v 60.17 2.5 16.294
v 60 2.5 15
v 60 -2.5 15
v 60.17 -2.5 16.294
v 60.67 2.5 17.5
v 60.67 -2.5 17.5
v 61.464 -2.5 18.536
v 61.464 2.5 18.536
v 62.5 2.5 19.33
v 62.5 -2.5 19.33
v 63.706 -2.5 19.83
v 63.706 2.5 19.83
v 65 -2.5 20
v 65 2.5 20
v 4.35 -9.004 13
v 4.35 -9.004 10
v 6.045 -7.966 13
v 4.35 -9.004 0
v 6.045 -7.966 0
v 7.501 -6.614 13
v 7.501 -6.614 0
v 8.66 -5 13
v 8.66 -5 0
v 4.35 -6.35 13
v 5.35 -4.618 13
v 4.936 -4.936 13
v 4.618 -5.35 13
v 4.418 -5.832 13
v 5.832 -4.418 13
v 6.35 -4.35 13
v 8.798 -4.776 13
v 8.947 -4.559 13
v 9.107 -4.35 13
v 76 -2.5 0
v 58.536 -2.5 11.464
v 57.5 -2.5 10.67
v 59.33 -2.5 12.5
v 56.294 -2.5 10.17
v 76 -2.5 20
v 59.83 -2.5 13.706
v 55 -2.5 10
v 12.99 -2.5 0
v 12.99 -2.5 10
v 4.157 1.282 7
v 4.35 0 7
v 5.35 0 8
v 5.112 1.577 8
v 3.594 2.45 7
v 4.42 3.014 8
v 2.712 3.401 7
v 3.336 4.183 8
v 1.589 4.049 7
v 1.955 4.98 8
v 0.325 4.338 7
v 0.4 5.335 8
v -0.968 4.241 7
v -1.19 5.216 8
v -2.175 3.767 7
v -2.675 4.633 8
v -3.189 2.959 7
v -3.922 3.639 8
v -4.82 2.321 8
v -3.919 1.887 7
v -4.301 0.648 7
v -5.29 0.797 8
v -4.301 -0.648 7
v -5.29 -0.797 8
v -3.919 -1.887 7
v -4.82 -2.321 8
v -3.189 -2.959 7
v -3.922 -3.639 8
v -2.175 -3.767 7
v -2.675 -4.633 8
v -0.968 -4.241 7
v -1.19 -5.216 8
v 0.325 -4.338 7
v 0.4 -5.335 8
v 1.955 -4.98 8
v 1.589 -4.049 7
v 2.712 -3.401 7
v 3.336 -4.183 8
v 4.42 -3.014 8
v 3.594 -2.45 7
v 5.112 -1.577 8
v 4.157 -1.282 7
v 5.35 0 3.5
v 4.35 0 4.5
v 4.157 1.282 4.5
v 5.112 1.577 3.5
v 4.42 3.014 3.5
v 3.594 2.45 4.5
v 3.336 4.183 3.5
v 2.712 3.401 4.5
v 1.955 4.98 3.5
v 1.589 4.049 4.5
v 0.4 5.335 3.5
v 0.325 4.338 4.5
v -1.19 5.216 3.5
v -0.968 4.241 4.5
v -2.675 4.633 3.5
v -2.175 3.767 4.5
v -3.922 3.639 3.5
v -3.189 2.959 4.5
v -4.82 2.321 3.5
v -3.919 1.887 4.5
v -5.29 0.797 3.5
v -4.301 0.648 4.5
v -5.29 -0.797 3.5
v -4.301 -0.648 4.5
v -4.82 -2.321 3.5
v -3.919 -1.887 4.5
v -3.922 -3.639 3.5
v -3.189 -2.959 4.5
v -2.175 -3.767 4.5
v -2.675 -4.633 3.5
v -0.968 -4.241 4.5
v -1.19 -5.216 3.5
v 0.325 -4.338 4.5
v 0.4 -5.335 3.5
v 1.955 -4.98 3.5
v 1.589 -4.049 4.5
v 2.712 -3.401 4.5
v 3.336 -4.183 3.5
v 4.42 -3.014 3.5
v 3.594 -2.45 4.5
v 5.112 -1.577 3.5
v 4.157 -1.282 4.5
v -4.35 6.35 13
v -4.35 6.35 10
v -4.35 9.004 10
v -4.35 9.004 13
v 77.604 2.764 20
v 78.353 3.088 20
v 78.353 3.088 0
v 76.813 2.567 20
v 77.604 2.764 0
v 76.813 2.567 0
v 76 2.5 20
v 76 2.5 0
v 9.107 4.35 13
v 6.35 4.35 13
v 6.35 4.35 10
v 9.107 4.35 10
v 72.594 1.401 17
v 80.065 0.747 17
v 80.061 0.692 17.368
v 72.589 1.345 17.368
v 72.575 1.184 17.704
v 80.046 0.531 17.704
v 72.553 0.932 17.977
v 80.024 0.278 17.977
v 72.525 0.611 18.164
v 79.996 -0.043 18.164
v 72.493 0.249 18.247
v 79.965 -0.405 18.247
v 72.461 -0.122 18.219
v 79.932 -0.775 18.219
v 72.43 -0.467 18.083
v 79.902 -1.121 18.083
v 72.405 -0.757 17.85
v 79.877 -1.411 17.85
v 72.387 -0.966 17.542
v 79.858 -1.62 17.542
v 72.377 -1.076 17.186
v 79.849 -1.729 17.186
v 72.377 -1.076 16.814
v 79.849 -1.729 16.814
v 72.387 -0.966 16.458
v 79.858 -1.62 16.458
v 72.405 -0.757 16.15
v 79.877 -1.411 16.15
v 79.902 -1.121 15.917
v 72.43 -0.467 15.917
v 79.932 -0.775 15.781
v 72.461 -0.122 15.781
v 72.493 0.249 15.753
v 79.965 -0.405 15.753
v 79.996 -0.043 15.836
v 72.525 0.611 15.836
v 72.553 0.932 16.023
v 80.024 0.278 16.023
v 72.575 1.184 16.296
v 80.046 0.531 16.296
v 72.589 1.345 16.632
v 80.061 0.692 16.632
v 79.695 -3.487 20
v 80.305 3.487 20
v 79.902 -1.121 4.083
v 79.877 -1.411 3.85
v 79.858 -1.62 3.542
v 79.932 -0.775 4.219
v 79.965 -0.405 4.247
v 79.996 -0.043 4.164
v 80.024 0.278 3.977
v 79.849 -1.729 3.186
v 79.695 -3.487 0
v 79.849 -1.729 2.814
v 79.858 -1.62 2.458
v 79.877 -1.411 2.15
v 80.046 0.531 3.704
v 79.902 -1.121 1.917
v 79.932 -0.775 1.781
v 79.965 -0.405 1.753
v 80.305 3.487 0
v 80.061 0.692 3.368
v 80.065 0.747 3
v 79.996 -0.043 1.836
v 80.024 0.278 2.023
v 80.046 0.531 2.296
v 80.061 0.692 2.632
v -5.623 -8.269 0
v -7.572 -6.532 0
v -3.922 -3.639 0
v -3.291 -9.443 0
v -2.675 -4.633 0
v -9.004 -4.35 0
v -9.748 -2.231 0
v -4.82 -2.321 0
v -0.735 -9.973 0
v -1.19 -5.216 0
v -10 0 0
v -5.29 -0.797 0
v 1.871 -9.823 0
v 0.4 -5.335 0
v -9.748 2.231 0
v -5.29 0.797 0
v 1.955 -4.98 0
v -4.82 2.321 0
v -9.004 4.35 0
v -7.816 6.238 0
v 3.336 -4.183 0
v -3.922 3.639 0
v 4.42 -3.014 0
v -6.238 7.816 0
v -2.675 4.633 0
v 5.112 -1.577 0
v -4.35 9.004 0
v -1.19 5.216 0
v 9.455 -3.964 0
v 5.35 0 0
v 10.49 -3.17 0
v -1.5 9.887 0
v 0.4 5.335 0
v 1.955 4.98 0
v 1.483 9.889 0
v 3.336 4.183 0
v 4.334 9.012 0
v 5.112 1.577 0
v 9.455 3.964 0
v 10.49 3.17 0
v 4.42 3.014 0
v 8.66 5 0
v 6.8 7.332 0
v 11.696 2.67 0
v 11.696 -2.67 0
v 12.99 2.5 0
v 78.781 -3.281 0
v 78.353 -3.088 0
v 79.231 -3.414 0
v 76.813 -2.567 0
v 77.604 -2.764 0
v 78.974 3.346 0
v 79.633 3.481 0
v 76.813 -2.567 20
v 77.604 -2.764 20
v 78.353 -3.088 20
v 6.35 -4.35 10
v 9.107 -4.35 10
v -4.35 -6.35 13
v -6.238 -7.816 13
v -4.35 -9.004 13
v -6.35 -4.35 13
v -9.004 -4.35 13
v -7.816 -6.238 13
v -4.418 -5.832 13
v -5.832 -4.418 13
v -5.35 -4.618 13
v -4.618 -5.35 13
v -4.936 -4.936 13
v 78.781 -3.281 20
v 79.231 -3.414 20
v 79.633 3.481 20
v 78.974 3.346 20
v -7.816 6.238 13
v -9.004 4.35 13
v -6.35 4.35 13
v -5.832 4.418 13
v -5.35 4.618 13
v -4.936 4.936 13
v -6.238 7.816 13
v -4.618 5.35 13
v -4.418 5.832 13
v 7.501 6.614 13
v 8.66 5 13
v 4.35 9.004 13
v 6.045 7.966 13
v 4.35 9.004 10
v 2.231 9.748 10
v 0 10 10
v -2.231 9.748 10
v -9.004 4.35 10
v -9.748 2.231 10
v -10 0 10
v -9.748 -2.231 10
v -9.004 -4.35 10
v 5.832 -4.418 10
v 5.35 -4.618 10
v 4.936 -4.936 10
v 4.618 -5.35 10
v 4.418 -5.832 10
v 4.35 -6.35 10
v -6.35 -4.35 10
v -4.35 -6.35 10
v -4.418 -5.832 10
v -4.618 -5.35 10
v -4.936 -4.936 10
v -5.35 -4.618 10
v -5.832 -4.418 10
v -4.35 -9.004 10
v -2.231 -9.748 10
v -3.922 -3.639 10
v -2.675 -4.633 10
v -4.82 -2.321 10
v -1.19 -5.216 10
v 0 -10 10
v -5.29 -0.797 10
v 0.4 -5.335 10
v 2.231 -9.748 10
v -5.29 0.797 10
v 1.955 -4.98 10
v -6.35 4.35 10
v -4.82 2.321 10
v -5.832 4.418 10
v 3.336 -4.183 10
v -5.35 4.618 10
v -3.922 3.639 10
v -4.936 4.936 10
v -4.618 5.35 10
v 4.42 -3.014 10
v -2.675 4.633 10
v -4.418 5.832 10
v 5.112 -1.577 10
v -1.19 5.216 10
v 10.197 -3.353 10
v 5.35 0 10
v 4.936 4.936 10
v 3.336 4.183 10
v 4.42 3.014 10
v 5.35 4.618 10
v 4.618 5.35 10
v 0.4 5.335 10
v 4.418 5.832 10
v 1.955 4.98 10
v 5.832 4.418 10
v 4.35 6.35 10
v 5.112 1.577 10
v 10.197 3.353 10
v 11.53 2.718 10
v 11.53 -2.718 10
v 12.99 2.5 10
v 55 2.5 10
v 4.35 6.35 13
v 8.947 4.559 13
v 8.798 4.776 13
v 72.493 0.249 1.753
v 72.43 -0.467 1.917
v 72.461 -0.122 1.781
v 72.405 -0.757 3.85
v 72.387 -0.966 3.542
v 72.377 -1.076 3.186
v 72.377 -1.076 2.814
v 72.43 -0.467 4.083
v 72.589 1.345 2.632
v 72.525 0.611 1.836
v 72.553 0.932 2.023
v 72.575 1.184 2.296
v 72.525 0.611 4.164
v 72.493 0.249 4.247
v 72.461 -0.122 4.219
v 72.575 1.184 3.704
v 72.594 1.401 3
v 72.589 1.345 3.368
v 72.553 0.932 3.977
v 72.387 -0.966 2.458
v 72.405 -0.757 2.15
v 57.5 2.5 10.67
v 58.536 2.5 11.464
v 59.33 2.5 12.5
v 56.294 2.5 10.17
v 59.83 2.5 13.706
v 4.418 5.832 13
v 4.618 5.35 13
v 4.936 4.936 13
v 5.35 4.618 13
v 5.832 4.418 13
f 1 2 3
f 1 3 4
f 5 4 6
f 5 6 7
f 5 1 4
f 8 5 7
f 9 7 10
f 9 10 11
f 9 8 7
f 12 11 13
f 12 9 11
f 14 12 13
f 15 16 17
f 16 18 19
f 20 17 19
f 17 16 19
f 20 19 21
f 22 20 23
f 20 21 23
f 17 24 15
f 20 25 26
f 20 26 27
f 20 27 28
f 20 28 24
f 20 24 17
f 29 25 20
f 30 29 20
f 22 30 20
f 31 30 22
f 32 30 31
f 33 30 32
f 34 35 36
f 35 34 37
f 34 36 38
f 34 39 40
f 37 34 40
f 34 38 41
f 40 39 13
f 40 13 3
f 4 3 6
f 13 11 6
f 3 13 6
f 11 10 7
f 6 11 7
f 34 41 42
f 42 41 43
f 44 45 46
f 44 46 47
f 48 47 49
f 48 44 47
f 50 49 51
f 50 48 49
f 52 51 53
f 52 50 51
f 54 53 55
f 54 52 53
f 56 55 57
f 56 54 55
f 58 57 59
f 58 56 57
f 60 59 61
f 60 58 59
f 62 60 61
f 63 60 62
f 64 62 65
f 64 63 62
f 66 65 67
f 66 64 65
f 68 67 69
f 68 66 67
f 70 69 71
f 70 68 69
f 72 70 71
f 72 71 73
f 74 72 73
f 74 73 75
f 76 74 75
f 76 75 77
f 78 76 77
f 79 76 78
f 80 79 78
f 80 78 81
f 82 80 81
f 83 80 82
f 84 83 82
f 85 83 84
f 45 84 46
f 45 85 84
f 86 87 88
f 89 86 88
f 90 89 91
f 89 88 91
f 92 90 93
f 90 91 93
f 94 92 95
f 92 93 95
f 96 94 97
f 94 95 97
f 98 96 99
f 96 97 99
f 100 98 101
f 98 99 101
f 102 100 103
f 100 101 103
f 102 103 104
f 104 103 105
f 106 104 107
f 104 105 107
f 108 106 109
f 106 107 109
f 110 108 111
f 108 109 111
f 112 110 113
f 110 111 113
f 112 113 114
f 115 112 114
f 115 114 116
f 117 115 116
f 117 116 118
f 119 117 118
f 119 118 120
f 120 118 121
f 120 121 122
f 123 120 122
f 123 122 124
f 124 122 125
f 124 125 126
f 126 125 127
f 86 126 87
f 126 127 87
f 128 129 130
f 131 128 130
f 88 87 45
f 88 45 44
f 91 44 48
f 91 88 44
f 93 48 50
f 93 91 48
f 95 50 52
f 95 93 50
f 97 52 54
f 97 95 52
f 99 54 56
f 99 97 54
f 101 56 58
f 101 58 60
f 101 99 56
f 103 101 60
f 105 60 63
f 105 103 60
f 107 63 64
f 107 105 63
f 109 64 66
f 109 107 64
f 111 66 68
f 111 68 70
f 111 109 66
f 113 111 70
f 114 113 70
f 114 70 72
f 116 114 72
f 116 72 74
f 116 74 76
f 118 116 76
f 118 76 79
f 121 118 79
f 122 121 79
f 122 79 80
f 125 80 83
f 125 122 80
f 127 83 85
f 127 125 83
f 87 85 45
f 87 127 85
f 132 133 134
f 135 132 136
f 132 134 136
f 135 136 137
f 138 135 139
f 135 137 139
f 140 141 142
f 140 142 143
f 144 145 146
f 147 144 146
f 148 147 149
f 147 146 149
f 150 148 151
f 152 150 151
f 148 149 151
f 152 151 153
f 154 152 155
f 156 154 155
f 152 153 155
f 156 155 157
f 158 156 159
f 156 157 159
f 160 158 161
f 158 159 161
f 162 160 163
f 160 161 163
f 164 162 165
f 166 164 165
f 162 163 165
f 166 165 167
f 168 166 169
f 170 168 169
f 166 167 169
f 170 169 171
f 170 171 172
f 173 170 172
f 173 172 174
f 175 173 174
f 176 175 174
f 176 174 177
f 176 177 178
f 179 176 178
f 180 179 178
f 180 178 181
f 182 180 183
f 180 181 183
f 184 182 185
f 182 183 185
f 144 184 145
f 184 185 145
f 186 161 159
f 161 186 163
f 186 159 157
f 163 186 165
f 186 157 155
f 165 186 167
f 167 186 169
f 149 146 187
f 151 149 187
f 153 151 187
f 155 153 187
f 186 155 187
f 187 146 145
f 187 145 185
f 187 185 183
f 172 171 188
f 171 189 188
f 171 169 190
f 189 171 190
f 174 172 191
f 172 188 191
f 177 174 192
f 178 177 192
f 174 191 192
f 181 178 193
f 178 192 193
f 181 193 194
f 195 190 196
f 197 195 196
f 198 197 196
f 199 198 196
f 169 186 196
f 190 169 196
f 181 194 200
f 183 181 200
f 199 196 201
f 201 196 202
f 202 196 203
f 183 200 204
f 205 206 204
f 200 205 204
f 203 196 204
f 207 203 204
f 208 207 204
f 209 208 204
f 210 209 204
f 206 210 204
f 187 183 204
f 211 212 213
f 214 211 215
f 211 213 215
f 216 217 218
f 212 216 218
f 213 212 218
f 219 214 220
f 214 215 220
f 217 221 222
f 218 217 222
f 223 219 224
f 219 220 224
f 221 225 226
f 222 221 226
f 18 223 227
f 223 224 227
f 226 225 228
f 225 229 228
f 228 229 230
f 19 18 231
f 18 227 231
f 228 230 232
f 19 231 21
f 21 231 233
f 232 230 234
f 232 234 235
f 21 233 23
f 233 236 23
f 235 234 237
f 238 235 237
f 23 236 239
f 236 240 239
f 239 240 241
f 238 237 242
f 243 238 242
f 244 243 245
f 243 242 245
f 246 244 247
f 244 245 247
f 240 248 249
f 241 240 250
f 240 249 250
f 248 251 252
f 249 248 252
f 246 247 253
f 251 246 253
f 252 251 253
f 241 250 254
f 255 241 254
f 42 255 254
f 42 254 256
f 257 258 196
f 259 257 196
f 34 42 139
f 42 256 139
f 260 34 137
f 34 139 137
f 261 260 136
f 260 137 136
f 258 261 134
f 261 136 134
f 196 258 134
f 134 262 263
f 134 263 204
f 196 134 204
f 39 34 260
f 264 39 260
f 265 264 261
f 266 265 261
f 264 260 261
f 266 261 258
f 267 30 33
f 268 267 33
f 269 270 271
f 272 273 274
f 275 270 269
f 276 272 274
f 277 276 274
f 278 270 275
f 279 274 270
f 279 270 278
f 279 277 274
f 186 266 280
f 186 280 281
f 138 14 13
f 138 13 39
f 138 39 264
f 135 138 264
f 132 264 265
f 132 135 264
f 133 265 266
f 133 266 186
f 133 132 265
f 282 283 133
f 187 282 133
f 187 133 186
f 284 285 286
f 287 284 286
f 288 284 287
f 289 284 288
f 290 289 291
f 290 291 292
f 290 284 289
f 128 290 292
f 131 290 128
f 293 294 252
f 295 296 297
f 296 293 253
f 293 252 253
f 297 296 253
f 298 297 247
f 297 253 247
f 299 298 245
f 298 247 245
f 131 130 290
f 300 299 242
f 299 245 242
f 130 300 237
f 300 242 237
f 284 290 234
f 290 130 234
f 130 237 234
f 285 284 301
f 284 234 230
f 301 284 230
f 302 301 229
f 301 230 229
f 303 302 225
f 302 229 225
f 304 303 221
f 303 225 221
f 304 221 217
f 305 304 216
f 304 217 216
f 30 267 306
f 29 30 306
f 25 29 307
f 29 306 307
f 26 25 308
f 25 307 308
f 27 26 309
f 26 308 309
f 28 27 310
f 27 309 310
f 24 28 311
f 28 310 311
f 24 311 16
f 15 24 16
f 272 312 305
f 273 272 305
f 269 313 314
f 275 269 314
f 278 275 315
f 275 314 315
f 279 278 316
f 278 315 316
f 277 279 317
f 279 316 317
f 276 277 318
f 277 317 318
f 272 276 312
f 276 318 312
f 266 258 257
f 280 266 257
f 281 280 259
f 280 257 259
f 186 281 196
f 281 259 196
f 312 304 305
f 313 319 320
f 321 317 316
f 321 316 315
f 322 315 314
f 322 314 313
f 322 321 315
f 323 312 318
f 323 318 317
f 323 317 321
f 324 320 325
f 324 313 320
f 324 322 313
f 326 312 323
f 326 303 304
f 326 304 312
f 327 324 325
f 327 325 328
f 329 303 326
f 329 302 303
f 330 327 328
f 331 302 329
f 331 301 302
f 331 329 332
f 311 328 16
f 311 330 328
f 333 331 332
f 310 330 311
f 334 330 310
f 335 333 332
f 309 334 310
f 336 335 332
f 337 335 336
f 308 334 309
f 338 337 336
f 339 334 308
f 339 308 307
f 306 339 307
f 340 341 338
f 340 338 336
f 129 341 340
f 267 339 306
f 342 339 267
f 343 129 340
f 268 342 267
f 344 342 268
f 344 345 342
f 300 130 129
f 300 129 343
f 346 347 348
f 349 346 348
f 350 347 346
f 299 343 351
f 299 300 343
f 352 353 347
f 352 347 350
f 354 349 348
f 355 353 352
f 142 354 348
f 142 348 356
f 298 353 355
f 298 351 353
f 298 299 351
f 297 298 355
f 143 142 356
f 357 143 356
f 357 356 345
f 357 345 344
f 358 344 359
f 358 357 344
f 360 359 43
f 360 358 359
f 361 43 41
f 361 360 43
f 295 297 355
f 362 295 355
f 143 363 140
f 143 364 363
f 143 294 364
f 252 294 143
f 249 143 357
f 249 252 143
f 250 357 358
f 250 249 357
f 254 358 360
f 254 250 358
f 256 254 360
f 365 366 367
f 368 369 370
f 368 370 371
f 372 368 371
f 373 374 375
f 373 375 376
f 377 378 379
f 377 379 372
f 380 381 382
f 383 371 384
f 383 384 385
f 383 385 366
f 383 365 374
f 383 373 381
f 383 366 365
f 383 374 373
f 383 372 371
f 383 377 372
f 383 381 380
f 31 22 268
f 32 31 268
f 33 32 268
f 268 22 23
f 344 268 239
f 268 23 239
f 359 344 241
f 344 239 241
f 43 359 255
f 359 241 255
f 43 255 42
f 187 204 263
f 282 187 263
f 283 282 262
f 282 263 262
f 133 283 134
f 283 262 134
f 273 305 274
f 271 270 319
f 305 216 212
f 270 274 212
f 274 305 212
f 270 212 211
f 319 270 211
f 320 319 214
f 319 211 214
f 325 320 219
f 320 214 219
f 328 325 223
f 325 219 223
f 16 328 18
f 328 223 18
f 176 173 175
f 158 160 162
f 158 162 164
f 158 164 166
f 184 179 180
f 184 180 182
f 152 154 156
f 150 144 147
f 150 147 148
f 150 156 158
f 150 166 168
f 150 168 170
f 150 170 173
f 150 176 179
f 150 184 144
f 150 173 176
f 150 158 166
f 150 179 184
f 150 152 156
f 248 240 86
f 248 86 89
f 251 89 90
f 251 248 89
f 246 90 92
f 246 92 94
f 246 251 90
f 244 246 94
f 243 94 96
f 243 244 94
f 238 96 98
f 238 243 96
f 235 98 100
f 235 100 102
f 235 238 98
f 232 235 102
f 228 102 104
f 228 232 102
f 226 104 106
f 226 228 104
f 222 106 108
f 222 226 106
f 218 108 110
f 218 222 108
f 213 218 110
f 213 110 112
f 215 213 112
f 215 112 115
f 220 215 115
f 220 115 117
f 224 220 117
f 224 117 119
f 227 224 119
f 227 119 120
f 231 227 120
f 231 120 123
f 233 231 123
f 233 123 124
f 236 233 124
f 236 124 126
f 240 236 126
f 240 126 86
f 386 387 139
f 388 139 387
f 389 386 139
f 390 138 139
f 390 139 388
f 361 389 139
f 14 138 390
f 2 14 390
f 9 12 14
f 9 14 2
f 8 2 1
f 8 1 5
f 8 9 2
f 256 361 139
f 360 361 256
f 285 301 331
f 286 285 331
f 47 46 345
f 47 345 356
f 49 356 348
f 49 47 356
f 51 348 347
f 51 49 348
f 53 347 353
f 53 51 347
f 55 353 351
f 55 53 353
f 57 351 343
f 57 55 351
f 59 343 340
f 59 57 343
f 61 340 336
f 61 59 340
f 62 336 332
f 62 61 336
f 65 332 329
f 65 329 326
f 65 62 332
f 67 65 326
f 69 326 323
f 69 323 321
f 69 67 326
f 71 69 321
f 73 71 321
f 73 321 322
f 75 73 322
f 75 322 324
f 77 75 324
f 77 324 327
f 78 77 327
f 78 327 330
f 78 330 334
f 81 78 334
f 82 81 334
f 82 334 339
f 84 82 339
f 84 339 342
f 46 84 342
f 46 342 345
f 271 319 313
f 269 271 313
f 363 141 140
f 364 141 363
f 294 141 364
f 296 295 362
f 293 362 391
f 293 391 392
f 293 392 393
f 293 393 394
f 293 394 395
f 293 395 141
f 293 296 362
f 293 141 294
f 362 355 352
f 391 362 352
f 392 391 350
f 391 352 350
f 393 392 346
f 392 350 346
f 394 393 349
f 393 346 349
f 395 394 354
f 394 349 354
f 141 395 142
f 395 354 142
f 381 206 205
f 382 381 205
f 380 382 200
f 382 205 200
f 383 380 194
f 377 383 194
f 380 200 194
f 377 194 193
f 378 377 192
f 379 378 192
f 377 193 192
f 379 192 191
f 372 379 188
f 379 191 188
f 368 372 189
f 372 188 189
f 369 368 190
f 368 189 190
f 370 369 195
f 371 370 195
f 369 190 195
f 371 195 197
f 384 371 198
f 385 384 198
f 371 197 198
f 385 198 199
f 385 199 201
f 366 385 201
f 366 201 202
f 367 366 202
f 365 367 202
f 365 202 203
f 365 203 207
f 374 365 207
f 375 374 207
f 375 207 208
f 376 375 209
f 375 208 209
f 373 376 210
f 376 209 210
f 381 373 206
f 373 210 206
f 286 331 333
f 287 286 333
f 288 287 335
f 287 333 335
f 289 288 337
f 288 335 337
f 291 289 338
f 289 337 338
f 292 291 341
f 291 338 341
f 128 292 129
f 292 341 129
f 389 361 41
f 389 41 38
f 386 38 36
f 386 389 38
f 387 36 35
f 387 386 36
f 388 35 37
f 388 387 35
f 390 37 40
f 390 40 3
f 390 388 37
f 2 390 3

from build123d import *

# Parameters (mm, degrees)
F0_R         = 5.35
F1_DEPTH     = 10
F2_START     = 3.5
F0_R_2       = 4.35
F2_DEPTH     = 4.5
F3_SIZE      = 0.99999
F4_DEPTH     = 13
F5_DEPTH     = 20
F6_R         = 1.25
F7_DEPTH     = 7.5
F8_T1_DEPTH  = 20
F8_T3_DEPTH  = 5
F8_T8_DEPTH  = 10
F8_T13_DEPTH = 10
F8_T18_DEPTH = 18.2698067281
F8_T25_DEPTH = 10
F8_T30_DEPTH = 10
F8_T35_DEPTH = 18.2698067281
F8_T39_DEPTH = 30


# Not quite as in the source:
# - a fillet or chamfer that OpenCascade refuses, or shapes differently, is made with other operations: its cross-section is extruded or revolved along the edge and cut away or added
# - a fillet or chamfer is up to 0.001 mm smaller than in the source, because OpenCascade refuses the exact size


with BuildPart() as f1:
    # F0 (on Top) → F1 (new body)
    with BuildSketch(Plane.XY):
        with BuildLine():
            Line((-4.35, 6.35), (-4.35, 9.0043045262))
            ThreePointArc((-4.35, 9.0043045262), (-7.0710678119, 7.0710678119), (-9.0043045262, 4.35))
            Line((-9.0043045262, 4.35), (-6.35, 4.35))
            ThreePointArc((-6.35, 4.35), (-4.9357864376, 4.9357864376), (-4.35, 6.35))
        make_face()
        with BuildLine():
            ThreePointArc((9.6824583655, -2.5), (9.9202969627, -1.2600429248), (10, 0))
            ThreePointArc((10, 0), (9.9202969627, 1.2600429248), (9.6824583655, 2.5))
            ThreePointArc((9.6824583655, 2.5), (9.3890575588, 3.4417434764), (9.0043045262, 4.35))
            Line((9.0043045262, 4.35), (6.35, 4.35))
            ThreePointArc((6.35, 4.35), (4.9357864376, 4.9357864376), (4.35, 6.35))
            Line((4.35, 6.35), (4.35, 9.0043045262))
            ThreePointArc((4.35, 9.0043045262), (0, 10), (-4.35, 9.0043045262))
            Line((-4.35, 9.0043045262), (-4.35, 6.35))
            ThreePointArc((-4.35, 6.35), (-4.9357864376, 4.9357864376), (-6.35, 4.35))
            Line((-6.35, 4.35), (-9.0043045262, 4.35))
            ThreePointArc((-9.0043045262, 4.35), (-10, 0), (-9.0043045262, -4.35))
            Line((-9.0043045262, -4.35), (-6.35, -4.35))
            ThreePointArc((-6.35, -4.35), (-4.9357864376, -4.9357864376), (-4.35, -6.35))
            Line((-4.35, -6.35), (-4.35, -9.0043045262))
            ThreePointArc((-4.35, -9.0043045262), (0, -10), (4.35, -9.0043045262))
            Line((4.35, -9.0043045262), (4.35, -6.35))
            ThreePointArc((4.35, -6.35), (4.9357864376, -4.9357864376), (6.35, -4.35))
            Line((6.35, -4.35), (9.0043045262, -4.35))
            ThreePointArc((9.0043045262, -4.35), (9.3890575588, -3.4417434764), (9.6824583655, -2.5))
        make_face()
        Circle(F0_R, mode=Mode.SUBTRACT)
        with BuildLine():
            ThreePointArc((-9.0043045262, -4.35), (-7.0710678119, -7.0710678119), (-4.35, -9.0043045262))
            Line((-4.35, -9.0043045262), (-4.35, -6.35))
            ThreePointArc((-4.35, -6.35), (-4.9357864376, -4.9357864376), (-6.35, -4.35))
            Line((-6.35, -4.35), (-9.0043045262, -4.35))
        make_face()
        with BuildLine():
            ThreePointArc((4.35, -9.0043045262), (7.0710678119, -7.0710678119), (9.0043045262, -4.35))
            Line((9.0043045262, -4.35), (6.35, -4.35))
            ThreePointArc((6.35, -4.35), (4.9357864376, -4.9357864376), (4.35, -6.35))
            Line((4.35, -6.35), (4.35, -9.0043045262))
        make_face()
        with BuildLine():
            Line((6.35, 4.35), (9.0043045262, 4.35))
            ThreePointArc((9.0043045262, 4.35), (7.0710678119, 7.0710678119), (4.35, 9.0043045262))
            Line((4.35, 9.0043045262), (4.35, 6.35))
            ThreePointArc((4.35, 6.35), (4.9357864376, 4.9357864376), (6.35, 4.35))
        make_face()
        with BuildLine():
            ThreePointArc((9.6824583655, 2.5), (9.9202969627, 1.2600429248), (10, 0))
            ThreePointArc((10, 0), (9.9202969627, -1.2600429248), (9.6824583655, -2.5))
            Line((9.6824583655, -2.5), (60, -2.5))
            Line((60, -2.5), (60, 2.5))
            Line((60, 2.5), (9.6824583655, 2.5))
        make_face()
        with BuildLine():
            Line((77.5505102572, 2.5), (60, 2.5))
            Line((60, 2.5), (60, -2.5))
            Line((60, -2.5), (77.5505102572, -2.5))
            ThreePointArc((77.5505102572, -2.5), (76.5, 0), (77.5505102572, 2.5))
        make_face()
        with BuildLine():
            ThreePointArc((80.3050450996, 3.4866814433), (78.8197263984, 3.2949892603), (77.5505102572, 2.5))
            ThreePointArc((77.5505102572, 2.5), (76.5, 0), (77.5505102572, -2.5))
            ThreePointArc((77.5505102572, -2.5), (78.5370404595, -3.179583209), (79.6949549004, -3.4866814433))
            Line((79.6949549004, -3.4866814433), (80, 0))
            Line((80, 0), (80.3050450996, 3.4866814433))
        make_face()
    extrude(amount=F1_DEPTH)

    # F0 (on Top) → F2 (join)
    with BuildSketch(Plane.XY.offset(F2_START)):
        Circle(F0_R)
        Circle(F0_R_2, mode=Mode.SUBTRACT)
    extrude(amount=F2_DEPTH)

    # F3 (size 1 in the source; OpenCascade refuses exactly that, so slightly less here)
    f3_edges = [f1.edges().sort_by_distance(p)[0] for p in [
        (-4.35, 0, 3.5),
        (-4.35, 0, 8),
    ]]
    chamfer(f3_edges, length=F3_SIZE)

    # F0 (on Top) → F4 (join)
    with BuildSketch(Plane.XY):
        with BuildLine():
            ThreePointArc((-9.0043045262, -4.35), (-7.0710678119, -7.0710678119), (-4.35, -9.0043045262))
            Line((-4.35, -9.0043045262), (-4.35, -6.35))
            ThreePointArc((-4.35, -6.35), (-4.9357864376, -4.9357864376), (-6.35, -4.35))
            Line((-6.35, -4.35), (-9.0043045262, -4.35))
        make_face()
        with BuildLine():
            ThreePointArc((4.35, -9.0043045262), (7.0710678119, -7.0710678119), (9.0043045262, -4.35))
            Line((9.0043045262, -4.35), (6.35, -4.35))
            ThreePointArc((6.35, -4.35), (4.9357864376, -4.9357864376), (4.35, -6.35))
            Line((4.35, -6.35), (4.35, -9.0043045262))
        make_face()
        with BuildLine():
            Line((6.35, 4.35), (9.0043045262, 4.35))
            ThreePointArc((9.0043045262, 4.35), (7.0710678119, 7.0710678119), (4.35, 9.0043045262))
            Line((4.35, 9.0043045262), (4.35, 6.35))
            ThreePointArc((4.35, 6.35), (4.9357864376, 4.9357864376), (6.35, 4.35))
        make_face()
        with BuildLine():
            Line((-4.35, 6.35), (-4.35, 9.0043045262))
            ThreePointArc((-4.35, 9.0043045262), (-7.0710678119, 7.0710678119), (-9.0043045262, 4.35))
            Line((-9.0043045262, 4.35), (-6.35, 4.35))
            ThreePointArc((-6.35, 4.35), (-4.9357864376, 4.9357864376), (-4.35, 6.35))
        make_face()
    extrude(amount=F4_DEPTH)

    # F0 (on Top) → F5 (join)
    with BuildSketch(Plane.XY):
        with BuildLine():
            ThreePointArc((80.3050450996, 3.4866814433), (78.8197263984, 3.2949892603), (77.5505102572, 2.5))
            ThreePointArc((77.5505102572, 2.5), (76.5, 0), (77.5505102572, -2.5))
            ThreePointArc((77.5505102572, -2.5), (78.5370404595, -3.179583209), (79.6949549004, -3.4866814433))
            Line((79.6949549004, -3.4866814433), (80, 0))
            Line((80, 0), (80.3050450996, 3.4866814433))
        make_face()
        with BuildLine():
            Line((77.5505102572, 2.5), (60, 2.5))
            Line((60, 2.5), (60, -2.5))
            Line((60, -2.5), (77.5505102572, -2.5))
            ThreePointArc((77.5505102572, -2.5), (76.5, 0), (77.5505102572, 2.5))
        make_face()
    extrude(amount=F5_DEPTH)

    # F6 (on face) → F7 (cut)
    with BuildSketch(Plane(origin=(79.3923101205, -6.9459271067, 0), x_dir=(0.0871557427, 0.9961946981, 0), z_dir=(0.9961946981, -0.0871557427, 0))):
        with Locations((6.4724594198, 17)):
            Circle(F6_R)
        with Locations((6.4724594198, 3)):
            Circle(F6_R)
    extrude(amount=-F7_DEPTH, mode=Mode.SUBTRACT)

    # F8: fillet of radius 5 on 6 edges, made by hand

    # F8_s2 → F8_t1 (join)
    with BuildSketch(Plane.XY):
        with BuildLine():
            ThreePointArc((78.3529411765, 3.0882352941), (77.2126781252, 2.6492874993), (76, 2.5))
            Line((76, 2.5), (77.5505102572, 2.5))
            ThreePointArc((77.5505102572, 2.5), (77.9307168562, 2.822776518), (78.3529411765, 3.0882352941))
        make_face()
        with BuildLine():
            ThreePointArc((76, -2.5), (77.2126781252, -2.6492874993), (78.3529411765, -3.0882352941))
            ThreePointArc((78.3529411765, -3.0882352941), (77.9307168562, -2.822776518), (77.5505102572, -2.5))
            Line((77.5505102572, -2.5), (76, -2.5))
        make_face()
    extrude(amount=F8_T1_DEPTH)

    # F8_s4 → F8_t3 (join)
    with BuildSketch(Plane.XZ.offset(-2.5)):
        with BuildLine():
            ThreePointArc((55, 10), (58.5355339059, 11.4644660941), (60, 15))
            Line((60, 15), (60, 10))
            Line((60, 10), (55, 10))
        make_face()
    extrude(amount=F8_T3_DEPTH)


with BuildPart() as f8_tool6:
    # F8_s7 → F8_t8 (new body)
    with BuildSketch(Plane.XY):
        with BuildLine():
            ThreePointArc((8.6602540378, 5), (10.4903810568, 3.1698729811), (12.9903810568, 2.5))
            Line((12.9903810568, 2.5), (9.6824583655, 2.5))
            ThreePointArc((9.6824583655, 2.5), (9.2561479341, 3.7846697903), (8.6602540378, 5))
        make_face()
    extrude(amount=F8_T8_DEPTH)

    split(bisect_by=Plane.XZ.offset(-4.35), keep=Keep.BOTTOM)


with BuildPart() as f1_1:
    add(f1.part)

    # F8_t5: union F8_tool6
    add(f8_tool6.part)


with BuildPart() as f8_tool11:
    # F8_s12 → F8_t13 (new body)
    with BuildSketch(Plane.XY):
        with BuildLine():
            ThreePointArc((8.6602540378, 5), (10.4903810568, 3.1698729811), (12.9903810568, 2.5))
            Line((12.9903810568, 2.5), (9.6824583655, 2.5))
            ThreePointArc((9.6824583655, 2.5), (9.2561479341, 3.7846697903), (8.6602540378, 5))
        make_face()
    extrude(amount=F8_T13_DEPTH)

    split(bisect_by=Plane.XZ.offset(-4.35), keep=Keep.TOP)


with BuildPart() as f1_2:
    add(f1_1.part)

    # F8_t10: union F8_tool11
    add(f8_tool11.part)


with BuildPart() as f8_tool16:
    # F8_s17 → F8_t18 (new body)
    with BuildSketch(Plane.XY):
        with BuildLine():
            ThreePointArc((8.6602540378, 5), (10.4903810568, 3.1698729811), (12.9903810568, 2.5))
            Line((12.9903810568, 2.5), (9.6824583655, 2.5))
            ThreePointArc((9.6824583655, 2.5), (9.2561479341, 3.7846697903), (8.6602540378, 5))
        make_face()
    extrude(amount=F8_T18_DEPTH)

    split(bisect_by=Plane.XY.offset(10), keep=Keep.TOP)

    split(bisect_by=Plane.XZ.offset(-4.35), keep=Keep.BOTTOM)

    split(bisect_by=Plane.XY.offset(13), keep=Keep.BOTTOM)


with BuildPart() as f1_3:
    add(f1_2.part)

    # F8_t15: union F8_tool16
    add(f8_tool16.part)


with BuildPart() as f8_tool23:
    # F8_s24 → F8_t25 (new body)
    with BuildSketch(Plane.XY):
        with BuildLine():
            ThreePointArc((8.6602540378, -5), (10.4903810568, -3.1698729811), (12.9903810568, -2.5))
            Line((12.9903810568, -2.5), (9.6824583655, -2.5))
            ThreePointArc((9.6824583655, -2.5), (9.2561479341, -3.7846697903), (8.6602540378, -5))
        make_face()
    extrude(amount=F8_T25_DEPTH)

    split(bisect_by=Plane.XZ.offset(4.35), keep=Keep.TOP)


with BuildPart() as f1_4:
    add(f1_3.part)

    # F8_t22: union F8_tool23
    add(f8_tool23.part)


with BuildPart() as f8_tool28:
    # F8_s29 → F8_t30 (new body)
    with BuildSketch(Plane.XY):
        with BuildLine():
            ThreePointArc((8.6602540378, -5), (10.4903810568, -3.1698729811), (12.9903810568, -2.5))
            Line((12.9903810568, -2.5), (9.6824583655, -2.5))
            ThreePointArc((9.6824583655, -2.5), (9.2561479341, -3.7846697903), (8.6602540378, -5))
        make_face()
    extrude(amount=F8_T30_DEPTH)

    split(bisect_by=Plane.XZ.offset(4.35), keep=Keep.BOTTOM)


with BuildPart() as f1_5:
    add(f1_4.part)

    # F8_t27: union F8_tool28
    add(f8_tool28.part)


with BuildPart() as f8_tool33:
    # F8_s34 → F8_t35 (new body)
    with BuildSketch(Plane.XY):
        with BuildLine():
            ThreePointArc((8.6602540378, -5), (10.4903810568, -3.1698729811), (12.9903810568, -2.5))
            Line((12.9903810568, -2.5), (9.6824583655, -2.5))
            ThreePointArc((9.6824583655, -2.5), (9.2561479341, -3.7846697903), (8.6602540378, -5))
        make_face()
    extrude(amount=F8_T35_DEPTH)

    split(bisect_by=Plane.XY.offset(10), keep=Keep.TOP)

    split(bisect_by=Plane.XY.offset(13), keep=Keep.BOTTOM)

    split(bisect_by=Plane.XZ.offset(4.35), keep=Keep.TOP)


with BuildPart() as f1_6:
    add(f1_5.part)

    # F8_t32: union F8_tool33
    add(f8_tool33.part)

    # F8_s40 → F8_t39 (cut)
    with BuildSketch(Plane.XZ.offset(-15)):
        with BuildLine():
            ThreePointArc((60, 15), (61.4644660941, 18.5355339059), (65, 20))
            Line((65, 20), (60, 20))
            Line((60, 20), (60, 15))
        make_face()
    extrude(amount=F8_T39_DEPTH, mode=Mode.SUBTRACT)


solid = f1_6.part
